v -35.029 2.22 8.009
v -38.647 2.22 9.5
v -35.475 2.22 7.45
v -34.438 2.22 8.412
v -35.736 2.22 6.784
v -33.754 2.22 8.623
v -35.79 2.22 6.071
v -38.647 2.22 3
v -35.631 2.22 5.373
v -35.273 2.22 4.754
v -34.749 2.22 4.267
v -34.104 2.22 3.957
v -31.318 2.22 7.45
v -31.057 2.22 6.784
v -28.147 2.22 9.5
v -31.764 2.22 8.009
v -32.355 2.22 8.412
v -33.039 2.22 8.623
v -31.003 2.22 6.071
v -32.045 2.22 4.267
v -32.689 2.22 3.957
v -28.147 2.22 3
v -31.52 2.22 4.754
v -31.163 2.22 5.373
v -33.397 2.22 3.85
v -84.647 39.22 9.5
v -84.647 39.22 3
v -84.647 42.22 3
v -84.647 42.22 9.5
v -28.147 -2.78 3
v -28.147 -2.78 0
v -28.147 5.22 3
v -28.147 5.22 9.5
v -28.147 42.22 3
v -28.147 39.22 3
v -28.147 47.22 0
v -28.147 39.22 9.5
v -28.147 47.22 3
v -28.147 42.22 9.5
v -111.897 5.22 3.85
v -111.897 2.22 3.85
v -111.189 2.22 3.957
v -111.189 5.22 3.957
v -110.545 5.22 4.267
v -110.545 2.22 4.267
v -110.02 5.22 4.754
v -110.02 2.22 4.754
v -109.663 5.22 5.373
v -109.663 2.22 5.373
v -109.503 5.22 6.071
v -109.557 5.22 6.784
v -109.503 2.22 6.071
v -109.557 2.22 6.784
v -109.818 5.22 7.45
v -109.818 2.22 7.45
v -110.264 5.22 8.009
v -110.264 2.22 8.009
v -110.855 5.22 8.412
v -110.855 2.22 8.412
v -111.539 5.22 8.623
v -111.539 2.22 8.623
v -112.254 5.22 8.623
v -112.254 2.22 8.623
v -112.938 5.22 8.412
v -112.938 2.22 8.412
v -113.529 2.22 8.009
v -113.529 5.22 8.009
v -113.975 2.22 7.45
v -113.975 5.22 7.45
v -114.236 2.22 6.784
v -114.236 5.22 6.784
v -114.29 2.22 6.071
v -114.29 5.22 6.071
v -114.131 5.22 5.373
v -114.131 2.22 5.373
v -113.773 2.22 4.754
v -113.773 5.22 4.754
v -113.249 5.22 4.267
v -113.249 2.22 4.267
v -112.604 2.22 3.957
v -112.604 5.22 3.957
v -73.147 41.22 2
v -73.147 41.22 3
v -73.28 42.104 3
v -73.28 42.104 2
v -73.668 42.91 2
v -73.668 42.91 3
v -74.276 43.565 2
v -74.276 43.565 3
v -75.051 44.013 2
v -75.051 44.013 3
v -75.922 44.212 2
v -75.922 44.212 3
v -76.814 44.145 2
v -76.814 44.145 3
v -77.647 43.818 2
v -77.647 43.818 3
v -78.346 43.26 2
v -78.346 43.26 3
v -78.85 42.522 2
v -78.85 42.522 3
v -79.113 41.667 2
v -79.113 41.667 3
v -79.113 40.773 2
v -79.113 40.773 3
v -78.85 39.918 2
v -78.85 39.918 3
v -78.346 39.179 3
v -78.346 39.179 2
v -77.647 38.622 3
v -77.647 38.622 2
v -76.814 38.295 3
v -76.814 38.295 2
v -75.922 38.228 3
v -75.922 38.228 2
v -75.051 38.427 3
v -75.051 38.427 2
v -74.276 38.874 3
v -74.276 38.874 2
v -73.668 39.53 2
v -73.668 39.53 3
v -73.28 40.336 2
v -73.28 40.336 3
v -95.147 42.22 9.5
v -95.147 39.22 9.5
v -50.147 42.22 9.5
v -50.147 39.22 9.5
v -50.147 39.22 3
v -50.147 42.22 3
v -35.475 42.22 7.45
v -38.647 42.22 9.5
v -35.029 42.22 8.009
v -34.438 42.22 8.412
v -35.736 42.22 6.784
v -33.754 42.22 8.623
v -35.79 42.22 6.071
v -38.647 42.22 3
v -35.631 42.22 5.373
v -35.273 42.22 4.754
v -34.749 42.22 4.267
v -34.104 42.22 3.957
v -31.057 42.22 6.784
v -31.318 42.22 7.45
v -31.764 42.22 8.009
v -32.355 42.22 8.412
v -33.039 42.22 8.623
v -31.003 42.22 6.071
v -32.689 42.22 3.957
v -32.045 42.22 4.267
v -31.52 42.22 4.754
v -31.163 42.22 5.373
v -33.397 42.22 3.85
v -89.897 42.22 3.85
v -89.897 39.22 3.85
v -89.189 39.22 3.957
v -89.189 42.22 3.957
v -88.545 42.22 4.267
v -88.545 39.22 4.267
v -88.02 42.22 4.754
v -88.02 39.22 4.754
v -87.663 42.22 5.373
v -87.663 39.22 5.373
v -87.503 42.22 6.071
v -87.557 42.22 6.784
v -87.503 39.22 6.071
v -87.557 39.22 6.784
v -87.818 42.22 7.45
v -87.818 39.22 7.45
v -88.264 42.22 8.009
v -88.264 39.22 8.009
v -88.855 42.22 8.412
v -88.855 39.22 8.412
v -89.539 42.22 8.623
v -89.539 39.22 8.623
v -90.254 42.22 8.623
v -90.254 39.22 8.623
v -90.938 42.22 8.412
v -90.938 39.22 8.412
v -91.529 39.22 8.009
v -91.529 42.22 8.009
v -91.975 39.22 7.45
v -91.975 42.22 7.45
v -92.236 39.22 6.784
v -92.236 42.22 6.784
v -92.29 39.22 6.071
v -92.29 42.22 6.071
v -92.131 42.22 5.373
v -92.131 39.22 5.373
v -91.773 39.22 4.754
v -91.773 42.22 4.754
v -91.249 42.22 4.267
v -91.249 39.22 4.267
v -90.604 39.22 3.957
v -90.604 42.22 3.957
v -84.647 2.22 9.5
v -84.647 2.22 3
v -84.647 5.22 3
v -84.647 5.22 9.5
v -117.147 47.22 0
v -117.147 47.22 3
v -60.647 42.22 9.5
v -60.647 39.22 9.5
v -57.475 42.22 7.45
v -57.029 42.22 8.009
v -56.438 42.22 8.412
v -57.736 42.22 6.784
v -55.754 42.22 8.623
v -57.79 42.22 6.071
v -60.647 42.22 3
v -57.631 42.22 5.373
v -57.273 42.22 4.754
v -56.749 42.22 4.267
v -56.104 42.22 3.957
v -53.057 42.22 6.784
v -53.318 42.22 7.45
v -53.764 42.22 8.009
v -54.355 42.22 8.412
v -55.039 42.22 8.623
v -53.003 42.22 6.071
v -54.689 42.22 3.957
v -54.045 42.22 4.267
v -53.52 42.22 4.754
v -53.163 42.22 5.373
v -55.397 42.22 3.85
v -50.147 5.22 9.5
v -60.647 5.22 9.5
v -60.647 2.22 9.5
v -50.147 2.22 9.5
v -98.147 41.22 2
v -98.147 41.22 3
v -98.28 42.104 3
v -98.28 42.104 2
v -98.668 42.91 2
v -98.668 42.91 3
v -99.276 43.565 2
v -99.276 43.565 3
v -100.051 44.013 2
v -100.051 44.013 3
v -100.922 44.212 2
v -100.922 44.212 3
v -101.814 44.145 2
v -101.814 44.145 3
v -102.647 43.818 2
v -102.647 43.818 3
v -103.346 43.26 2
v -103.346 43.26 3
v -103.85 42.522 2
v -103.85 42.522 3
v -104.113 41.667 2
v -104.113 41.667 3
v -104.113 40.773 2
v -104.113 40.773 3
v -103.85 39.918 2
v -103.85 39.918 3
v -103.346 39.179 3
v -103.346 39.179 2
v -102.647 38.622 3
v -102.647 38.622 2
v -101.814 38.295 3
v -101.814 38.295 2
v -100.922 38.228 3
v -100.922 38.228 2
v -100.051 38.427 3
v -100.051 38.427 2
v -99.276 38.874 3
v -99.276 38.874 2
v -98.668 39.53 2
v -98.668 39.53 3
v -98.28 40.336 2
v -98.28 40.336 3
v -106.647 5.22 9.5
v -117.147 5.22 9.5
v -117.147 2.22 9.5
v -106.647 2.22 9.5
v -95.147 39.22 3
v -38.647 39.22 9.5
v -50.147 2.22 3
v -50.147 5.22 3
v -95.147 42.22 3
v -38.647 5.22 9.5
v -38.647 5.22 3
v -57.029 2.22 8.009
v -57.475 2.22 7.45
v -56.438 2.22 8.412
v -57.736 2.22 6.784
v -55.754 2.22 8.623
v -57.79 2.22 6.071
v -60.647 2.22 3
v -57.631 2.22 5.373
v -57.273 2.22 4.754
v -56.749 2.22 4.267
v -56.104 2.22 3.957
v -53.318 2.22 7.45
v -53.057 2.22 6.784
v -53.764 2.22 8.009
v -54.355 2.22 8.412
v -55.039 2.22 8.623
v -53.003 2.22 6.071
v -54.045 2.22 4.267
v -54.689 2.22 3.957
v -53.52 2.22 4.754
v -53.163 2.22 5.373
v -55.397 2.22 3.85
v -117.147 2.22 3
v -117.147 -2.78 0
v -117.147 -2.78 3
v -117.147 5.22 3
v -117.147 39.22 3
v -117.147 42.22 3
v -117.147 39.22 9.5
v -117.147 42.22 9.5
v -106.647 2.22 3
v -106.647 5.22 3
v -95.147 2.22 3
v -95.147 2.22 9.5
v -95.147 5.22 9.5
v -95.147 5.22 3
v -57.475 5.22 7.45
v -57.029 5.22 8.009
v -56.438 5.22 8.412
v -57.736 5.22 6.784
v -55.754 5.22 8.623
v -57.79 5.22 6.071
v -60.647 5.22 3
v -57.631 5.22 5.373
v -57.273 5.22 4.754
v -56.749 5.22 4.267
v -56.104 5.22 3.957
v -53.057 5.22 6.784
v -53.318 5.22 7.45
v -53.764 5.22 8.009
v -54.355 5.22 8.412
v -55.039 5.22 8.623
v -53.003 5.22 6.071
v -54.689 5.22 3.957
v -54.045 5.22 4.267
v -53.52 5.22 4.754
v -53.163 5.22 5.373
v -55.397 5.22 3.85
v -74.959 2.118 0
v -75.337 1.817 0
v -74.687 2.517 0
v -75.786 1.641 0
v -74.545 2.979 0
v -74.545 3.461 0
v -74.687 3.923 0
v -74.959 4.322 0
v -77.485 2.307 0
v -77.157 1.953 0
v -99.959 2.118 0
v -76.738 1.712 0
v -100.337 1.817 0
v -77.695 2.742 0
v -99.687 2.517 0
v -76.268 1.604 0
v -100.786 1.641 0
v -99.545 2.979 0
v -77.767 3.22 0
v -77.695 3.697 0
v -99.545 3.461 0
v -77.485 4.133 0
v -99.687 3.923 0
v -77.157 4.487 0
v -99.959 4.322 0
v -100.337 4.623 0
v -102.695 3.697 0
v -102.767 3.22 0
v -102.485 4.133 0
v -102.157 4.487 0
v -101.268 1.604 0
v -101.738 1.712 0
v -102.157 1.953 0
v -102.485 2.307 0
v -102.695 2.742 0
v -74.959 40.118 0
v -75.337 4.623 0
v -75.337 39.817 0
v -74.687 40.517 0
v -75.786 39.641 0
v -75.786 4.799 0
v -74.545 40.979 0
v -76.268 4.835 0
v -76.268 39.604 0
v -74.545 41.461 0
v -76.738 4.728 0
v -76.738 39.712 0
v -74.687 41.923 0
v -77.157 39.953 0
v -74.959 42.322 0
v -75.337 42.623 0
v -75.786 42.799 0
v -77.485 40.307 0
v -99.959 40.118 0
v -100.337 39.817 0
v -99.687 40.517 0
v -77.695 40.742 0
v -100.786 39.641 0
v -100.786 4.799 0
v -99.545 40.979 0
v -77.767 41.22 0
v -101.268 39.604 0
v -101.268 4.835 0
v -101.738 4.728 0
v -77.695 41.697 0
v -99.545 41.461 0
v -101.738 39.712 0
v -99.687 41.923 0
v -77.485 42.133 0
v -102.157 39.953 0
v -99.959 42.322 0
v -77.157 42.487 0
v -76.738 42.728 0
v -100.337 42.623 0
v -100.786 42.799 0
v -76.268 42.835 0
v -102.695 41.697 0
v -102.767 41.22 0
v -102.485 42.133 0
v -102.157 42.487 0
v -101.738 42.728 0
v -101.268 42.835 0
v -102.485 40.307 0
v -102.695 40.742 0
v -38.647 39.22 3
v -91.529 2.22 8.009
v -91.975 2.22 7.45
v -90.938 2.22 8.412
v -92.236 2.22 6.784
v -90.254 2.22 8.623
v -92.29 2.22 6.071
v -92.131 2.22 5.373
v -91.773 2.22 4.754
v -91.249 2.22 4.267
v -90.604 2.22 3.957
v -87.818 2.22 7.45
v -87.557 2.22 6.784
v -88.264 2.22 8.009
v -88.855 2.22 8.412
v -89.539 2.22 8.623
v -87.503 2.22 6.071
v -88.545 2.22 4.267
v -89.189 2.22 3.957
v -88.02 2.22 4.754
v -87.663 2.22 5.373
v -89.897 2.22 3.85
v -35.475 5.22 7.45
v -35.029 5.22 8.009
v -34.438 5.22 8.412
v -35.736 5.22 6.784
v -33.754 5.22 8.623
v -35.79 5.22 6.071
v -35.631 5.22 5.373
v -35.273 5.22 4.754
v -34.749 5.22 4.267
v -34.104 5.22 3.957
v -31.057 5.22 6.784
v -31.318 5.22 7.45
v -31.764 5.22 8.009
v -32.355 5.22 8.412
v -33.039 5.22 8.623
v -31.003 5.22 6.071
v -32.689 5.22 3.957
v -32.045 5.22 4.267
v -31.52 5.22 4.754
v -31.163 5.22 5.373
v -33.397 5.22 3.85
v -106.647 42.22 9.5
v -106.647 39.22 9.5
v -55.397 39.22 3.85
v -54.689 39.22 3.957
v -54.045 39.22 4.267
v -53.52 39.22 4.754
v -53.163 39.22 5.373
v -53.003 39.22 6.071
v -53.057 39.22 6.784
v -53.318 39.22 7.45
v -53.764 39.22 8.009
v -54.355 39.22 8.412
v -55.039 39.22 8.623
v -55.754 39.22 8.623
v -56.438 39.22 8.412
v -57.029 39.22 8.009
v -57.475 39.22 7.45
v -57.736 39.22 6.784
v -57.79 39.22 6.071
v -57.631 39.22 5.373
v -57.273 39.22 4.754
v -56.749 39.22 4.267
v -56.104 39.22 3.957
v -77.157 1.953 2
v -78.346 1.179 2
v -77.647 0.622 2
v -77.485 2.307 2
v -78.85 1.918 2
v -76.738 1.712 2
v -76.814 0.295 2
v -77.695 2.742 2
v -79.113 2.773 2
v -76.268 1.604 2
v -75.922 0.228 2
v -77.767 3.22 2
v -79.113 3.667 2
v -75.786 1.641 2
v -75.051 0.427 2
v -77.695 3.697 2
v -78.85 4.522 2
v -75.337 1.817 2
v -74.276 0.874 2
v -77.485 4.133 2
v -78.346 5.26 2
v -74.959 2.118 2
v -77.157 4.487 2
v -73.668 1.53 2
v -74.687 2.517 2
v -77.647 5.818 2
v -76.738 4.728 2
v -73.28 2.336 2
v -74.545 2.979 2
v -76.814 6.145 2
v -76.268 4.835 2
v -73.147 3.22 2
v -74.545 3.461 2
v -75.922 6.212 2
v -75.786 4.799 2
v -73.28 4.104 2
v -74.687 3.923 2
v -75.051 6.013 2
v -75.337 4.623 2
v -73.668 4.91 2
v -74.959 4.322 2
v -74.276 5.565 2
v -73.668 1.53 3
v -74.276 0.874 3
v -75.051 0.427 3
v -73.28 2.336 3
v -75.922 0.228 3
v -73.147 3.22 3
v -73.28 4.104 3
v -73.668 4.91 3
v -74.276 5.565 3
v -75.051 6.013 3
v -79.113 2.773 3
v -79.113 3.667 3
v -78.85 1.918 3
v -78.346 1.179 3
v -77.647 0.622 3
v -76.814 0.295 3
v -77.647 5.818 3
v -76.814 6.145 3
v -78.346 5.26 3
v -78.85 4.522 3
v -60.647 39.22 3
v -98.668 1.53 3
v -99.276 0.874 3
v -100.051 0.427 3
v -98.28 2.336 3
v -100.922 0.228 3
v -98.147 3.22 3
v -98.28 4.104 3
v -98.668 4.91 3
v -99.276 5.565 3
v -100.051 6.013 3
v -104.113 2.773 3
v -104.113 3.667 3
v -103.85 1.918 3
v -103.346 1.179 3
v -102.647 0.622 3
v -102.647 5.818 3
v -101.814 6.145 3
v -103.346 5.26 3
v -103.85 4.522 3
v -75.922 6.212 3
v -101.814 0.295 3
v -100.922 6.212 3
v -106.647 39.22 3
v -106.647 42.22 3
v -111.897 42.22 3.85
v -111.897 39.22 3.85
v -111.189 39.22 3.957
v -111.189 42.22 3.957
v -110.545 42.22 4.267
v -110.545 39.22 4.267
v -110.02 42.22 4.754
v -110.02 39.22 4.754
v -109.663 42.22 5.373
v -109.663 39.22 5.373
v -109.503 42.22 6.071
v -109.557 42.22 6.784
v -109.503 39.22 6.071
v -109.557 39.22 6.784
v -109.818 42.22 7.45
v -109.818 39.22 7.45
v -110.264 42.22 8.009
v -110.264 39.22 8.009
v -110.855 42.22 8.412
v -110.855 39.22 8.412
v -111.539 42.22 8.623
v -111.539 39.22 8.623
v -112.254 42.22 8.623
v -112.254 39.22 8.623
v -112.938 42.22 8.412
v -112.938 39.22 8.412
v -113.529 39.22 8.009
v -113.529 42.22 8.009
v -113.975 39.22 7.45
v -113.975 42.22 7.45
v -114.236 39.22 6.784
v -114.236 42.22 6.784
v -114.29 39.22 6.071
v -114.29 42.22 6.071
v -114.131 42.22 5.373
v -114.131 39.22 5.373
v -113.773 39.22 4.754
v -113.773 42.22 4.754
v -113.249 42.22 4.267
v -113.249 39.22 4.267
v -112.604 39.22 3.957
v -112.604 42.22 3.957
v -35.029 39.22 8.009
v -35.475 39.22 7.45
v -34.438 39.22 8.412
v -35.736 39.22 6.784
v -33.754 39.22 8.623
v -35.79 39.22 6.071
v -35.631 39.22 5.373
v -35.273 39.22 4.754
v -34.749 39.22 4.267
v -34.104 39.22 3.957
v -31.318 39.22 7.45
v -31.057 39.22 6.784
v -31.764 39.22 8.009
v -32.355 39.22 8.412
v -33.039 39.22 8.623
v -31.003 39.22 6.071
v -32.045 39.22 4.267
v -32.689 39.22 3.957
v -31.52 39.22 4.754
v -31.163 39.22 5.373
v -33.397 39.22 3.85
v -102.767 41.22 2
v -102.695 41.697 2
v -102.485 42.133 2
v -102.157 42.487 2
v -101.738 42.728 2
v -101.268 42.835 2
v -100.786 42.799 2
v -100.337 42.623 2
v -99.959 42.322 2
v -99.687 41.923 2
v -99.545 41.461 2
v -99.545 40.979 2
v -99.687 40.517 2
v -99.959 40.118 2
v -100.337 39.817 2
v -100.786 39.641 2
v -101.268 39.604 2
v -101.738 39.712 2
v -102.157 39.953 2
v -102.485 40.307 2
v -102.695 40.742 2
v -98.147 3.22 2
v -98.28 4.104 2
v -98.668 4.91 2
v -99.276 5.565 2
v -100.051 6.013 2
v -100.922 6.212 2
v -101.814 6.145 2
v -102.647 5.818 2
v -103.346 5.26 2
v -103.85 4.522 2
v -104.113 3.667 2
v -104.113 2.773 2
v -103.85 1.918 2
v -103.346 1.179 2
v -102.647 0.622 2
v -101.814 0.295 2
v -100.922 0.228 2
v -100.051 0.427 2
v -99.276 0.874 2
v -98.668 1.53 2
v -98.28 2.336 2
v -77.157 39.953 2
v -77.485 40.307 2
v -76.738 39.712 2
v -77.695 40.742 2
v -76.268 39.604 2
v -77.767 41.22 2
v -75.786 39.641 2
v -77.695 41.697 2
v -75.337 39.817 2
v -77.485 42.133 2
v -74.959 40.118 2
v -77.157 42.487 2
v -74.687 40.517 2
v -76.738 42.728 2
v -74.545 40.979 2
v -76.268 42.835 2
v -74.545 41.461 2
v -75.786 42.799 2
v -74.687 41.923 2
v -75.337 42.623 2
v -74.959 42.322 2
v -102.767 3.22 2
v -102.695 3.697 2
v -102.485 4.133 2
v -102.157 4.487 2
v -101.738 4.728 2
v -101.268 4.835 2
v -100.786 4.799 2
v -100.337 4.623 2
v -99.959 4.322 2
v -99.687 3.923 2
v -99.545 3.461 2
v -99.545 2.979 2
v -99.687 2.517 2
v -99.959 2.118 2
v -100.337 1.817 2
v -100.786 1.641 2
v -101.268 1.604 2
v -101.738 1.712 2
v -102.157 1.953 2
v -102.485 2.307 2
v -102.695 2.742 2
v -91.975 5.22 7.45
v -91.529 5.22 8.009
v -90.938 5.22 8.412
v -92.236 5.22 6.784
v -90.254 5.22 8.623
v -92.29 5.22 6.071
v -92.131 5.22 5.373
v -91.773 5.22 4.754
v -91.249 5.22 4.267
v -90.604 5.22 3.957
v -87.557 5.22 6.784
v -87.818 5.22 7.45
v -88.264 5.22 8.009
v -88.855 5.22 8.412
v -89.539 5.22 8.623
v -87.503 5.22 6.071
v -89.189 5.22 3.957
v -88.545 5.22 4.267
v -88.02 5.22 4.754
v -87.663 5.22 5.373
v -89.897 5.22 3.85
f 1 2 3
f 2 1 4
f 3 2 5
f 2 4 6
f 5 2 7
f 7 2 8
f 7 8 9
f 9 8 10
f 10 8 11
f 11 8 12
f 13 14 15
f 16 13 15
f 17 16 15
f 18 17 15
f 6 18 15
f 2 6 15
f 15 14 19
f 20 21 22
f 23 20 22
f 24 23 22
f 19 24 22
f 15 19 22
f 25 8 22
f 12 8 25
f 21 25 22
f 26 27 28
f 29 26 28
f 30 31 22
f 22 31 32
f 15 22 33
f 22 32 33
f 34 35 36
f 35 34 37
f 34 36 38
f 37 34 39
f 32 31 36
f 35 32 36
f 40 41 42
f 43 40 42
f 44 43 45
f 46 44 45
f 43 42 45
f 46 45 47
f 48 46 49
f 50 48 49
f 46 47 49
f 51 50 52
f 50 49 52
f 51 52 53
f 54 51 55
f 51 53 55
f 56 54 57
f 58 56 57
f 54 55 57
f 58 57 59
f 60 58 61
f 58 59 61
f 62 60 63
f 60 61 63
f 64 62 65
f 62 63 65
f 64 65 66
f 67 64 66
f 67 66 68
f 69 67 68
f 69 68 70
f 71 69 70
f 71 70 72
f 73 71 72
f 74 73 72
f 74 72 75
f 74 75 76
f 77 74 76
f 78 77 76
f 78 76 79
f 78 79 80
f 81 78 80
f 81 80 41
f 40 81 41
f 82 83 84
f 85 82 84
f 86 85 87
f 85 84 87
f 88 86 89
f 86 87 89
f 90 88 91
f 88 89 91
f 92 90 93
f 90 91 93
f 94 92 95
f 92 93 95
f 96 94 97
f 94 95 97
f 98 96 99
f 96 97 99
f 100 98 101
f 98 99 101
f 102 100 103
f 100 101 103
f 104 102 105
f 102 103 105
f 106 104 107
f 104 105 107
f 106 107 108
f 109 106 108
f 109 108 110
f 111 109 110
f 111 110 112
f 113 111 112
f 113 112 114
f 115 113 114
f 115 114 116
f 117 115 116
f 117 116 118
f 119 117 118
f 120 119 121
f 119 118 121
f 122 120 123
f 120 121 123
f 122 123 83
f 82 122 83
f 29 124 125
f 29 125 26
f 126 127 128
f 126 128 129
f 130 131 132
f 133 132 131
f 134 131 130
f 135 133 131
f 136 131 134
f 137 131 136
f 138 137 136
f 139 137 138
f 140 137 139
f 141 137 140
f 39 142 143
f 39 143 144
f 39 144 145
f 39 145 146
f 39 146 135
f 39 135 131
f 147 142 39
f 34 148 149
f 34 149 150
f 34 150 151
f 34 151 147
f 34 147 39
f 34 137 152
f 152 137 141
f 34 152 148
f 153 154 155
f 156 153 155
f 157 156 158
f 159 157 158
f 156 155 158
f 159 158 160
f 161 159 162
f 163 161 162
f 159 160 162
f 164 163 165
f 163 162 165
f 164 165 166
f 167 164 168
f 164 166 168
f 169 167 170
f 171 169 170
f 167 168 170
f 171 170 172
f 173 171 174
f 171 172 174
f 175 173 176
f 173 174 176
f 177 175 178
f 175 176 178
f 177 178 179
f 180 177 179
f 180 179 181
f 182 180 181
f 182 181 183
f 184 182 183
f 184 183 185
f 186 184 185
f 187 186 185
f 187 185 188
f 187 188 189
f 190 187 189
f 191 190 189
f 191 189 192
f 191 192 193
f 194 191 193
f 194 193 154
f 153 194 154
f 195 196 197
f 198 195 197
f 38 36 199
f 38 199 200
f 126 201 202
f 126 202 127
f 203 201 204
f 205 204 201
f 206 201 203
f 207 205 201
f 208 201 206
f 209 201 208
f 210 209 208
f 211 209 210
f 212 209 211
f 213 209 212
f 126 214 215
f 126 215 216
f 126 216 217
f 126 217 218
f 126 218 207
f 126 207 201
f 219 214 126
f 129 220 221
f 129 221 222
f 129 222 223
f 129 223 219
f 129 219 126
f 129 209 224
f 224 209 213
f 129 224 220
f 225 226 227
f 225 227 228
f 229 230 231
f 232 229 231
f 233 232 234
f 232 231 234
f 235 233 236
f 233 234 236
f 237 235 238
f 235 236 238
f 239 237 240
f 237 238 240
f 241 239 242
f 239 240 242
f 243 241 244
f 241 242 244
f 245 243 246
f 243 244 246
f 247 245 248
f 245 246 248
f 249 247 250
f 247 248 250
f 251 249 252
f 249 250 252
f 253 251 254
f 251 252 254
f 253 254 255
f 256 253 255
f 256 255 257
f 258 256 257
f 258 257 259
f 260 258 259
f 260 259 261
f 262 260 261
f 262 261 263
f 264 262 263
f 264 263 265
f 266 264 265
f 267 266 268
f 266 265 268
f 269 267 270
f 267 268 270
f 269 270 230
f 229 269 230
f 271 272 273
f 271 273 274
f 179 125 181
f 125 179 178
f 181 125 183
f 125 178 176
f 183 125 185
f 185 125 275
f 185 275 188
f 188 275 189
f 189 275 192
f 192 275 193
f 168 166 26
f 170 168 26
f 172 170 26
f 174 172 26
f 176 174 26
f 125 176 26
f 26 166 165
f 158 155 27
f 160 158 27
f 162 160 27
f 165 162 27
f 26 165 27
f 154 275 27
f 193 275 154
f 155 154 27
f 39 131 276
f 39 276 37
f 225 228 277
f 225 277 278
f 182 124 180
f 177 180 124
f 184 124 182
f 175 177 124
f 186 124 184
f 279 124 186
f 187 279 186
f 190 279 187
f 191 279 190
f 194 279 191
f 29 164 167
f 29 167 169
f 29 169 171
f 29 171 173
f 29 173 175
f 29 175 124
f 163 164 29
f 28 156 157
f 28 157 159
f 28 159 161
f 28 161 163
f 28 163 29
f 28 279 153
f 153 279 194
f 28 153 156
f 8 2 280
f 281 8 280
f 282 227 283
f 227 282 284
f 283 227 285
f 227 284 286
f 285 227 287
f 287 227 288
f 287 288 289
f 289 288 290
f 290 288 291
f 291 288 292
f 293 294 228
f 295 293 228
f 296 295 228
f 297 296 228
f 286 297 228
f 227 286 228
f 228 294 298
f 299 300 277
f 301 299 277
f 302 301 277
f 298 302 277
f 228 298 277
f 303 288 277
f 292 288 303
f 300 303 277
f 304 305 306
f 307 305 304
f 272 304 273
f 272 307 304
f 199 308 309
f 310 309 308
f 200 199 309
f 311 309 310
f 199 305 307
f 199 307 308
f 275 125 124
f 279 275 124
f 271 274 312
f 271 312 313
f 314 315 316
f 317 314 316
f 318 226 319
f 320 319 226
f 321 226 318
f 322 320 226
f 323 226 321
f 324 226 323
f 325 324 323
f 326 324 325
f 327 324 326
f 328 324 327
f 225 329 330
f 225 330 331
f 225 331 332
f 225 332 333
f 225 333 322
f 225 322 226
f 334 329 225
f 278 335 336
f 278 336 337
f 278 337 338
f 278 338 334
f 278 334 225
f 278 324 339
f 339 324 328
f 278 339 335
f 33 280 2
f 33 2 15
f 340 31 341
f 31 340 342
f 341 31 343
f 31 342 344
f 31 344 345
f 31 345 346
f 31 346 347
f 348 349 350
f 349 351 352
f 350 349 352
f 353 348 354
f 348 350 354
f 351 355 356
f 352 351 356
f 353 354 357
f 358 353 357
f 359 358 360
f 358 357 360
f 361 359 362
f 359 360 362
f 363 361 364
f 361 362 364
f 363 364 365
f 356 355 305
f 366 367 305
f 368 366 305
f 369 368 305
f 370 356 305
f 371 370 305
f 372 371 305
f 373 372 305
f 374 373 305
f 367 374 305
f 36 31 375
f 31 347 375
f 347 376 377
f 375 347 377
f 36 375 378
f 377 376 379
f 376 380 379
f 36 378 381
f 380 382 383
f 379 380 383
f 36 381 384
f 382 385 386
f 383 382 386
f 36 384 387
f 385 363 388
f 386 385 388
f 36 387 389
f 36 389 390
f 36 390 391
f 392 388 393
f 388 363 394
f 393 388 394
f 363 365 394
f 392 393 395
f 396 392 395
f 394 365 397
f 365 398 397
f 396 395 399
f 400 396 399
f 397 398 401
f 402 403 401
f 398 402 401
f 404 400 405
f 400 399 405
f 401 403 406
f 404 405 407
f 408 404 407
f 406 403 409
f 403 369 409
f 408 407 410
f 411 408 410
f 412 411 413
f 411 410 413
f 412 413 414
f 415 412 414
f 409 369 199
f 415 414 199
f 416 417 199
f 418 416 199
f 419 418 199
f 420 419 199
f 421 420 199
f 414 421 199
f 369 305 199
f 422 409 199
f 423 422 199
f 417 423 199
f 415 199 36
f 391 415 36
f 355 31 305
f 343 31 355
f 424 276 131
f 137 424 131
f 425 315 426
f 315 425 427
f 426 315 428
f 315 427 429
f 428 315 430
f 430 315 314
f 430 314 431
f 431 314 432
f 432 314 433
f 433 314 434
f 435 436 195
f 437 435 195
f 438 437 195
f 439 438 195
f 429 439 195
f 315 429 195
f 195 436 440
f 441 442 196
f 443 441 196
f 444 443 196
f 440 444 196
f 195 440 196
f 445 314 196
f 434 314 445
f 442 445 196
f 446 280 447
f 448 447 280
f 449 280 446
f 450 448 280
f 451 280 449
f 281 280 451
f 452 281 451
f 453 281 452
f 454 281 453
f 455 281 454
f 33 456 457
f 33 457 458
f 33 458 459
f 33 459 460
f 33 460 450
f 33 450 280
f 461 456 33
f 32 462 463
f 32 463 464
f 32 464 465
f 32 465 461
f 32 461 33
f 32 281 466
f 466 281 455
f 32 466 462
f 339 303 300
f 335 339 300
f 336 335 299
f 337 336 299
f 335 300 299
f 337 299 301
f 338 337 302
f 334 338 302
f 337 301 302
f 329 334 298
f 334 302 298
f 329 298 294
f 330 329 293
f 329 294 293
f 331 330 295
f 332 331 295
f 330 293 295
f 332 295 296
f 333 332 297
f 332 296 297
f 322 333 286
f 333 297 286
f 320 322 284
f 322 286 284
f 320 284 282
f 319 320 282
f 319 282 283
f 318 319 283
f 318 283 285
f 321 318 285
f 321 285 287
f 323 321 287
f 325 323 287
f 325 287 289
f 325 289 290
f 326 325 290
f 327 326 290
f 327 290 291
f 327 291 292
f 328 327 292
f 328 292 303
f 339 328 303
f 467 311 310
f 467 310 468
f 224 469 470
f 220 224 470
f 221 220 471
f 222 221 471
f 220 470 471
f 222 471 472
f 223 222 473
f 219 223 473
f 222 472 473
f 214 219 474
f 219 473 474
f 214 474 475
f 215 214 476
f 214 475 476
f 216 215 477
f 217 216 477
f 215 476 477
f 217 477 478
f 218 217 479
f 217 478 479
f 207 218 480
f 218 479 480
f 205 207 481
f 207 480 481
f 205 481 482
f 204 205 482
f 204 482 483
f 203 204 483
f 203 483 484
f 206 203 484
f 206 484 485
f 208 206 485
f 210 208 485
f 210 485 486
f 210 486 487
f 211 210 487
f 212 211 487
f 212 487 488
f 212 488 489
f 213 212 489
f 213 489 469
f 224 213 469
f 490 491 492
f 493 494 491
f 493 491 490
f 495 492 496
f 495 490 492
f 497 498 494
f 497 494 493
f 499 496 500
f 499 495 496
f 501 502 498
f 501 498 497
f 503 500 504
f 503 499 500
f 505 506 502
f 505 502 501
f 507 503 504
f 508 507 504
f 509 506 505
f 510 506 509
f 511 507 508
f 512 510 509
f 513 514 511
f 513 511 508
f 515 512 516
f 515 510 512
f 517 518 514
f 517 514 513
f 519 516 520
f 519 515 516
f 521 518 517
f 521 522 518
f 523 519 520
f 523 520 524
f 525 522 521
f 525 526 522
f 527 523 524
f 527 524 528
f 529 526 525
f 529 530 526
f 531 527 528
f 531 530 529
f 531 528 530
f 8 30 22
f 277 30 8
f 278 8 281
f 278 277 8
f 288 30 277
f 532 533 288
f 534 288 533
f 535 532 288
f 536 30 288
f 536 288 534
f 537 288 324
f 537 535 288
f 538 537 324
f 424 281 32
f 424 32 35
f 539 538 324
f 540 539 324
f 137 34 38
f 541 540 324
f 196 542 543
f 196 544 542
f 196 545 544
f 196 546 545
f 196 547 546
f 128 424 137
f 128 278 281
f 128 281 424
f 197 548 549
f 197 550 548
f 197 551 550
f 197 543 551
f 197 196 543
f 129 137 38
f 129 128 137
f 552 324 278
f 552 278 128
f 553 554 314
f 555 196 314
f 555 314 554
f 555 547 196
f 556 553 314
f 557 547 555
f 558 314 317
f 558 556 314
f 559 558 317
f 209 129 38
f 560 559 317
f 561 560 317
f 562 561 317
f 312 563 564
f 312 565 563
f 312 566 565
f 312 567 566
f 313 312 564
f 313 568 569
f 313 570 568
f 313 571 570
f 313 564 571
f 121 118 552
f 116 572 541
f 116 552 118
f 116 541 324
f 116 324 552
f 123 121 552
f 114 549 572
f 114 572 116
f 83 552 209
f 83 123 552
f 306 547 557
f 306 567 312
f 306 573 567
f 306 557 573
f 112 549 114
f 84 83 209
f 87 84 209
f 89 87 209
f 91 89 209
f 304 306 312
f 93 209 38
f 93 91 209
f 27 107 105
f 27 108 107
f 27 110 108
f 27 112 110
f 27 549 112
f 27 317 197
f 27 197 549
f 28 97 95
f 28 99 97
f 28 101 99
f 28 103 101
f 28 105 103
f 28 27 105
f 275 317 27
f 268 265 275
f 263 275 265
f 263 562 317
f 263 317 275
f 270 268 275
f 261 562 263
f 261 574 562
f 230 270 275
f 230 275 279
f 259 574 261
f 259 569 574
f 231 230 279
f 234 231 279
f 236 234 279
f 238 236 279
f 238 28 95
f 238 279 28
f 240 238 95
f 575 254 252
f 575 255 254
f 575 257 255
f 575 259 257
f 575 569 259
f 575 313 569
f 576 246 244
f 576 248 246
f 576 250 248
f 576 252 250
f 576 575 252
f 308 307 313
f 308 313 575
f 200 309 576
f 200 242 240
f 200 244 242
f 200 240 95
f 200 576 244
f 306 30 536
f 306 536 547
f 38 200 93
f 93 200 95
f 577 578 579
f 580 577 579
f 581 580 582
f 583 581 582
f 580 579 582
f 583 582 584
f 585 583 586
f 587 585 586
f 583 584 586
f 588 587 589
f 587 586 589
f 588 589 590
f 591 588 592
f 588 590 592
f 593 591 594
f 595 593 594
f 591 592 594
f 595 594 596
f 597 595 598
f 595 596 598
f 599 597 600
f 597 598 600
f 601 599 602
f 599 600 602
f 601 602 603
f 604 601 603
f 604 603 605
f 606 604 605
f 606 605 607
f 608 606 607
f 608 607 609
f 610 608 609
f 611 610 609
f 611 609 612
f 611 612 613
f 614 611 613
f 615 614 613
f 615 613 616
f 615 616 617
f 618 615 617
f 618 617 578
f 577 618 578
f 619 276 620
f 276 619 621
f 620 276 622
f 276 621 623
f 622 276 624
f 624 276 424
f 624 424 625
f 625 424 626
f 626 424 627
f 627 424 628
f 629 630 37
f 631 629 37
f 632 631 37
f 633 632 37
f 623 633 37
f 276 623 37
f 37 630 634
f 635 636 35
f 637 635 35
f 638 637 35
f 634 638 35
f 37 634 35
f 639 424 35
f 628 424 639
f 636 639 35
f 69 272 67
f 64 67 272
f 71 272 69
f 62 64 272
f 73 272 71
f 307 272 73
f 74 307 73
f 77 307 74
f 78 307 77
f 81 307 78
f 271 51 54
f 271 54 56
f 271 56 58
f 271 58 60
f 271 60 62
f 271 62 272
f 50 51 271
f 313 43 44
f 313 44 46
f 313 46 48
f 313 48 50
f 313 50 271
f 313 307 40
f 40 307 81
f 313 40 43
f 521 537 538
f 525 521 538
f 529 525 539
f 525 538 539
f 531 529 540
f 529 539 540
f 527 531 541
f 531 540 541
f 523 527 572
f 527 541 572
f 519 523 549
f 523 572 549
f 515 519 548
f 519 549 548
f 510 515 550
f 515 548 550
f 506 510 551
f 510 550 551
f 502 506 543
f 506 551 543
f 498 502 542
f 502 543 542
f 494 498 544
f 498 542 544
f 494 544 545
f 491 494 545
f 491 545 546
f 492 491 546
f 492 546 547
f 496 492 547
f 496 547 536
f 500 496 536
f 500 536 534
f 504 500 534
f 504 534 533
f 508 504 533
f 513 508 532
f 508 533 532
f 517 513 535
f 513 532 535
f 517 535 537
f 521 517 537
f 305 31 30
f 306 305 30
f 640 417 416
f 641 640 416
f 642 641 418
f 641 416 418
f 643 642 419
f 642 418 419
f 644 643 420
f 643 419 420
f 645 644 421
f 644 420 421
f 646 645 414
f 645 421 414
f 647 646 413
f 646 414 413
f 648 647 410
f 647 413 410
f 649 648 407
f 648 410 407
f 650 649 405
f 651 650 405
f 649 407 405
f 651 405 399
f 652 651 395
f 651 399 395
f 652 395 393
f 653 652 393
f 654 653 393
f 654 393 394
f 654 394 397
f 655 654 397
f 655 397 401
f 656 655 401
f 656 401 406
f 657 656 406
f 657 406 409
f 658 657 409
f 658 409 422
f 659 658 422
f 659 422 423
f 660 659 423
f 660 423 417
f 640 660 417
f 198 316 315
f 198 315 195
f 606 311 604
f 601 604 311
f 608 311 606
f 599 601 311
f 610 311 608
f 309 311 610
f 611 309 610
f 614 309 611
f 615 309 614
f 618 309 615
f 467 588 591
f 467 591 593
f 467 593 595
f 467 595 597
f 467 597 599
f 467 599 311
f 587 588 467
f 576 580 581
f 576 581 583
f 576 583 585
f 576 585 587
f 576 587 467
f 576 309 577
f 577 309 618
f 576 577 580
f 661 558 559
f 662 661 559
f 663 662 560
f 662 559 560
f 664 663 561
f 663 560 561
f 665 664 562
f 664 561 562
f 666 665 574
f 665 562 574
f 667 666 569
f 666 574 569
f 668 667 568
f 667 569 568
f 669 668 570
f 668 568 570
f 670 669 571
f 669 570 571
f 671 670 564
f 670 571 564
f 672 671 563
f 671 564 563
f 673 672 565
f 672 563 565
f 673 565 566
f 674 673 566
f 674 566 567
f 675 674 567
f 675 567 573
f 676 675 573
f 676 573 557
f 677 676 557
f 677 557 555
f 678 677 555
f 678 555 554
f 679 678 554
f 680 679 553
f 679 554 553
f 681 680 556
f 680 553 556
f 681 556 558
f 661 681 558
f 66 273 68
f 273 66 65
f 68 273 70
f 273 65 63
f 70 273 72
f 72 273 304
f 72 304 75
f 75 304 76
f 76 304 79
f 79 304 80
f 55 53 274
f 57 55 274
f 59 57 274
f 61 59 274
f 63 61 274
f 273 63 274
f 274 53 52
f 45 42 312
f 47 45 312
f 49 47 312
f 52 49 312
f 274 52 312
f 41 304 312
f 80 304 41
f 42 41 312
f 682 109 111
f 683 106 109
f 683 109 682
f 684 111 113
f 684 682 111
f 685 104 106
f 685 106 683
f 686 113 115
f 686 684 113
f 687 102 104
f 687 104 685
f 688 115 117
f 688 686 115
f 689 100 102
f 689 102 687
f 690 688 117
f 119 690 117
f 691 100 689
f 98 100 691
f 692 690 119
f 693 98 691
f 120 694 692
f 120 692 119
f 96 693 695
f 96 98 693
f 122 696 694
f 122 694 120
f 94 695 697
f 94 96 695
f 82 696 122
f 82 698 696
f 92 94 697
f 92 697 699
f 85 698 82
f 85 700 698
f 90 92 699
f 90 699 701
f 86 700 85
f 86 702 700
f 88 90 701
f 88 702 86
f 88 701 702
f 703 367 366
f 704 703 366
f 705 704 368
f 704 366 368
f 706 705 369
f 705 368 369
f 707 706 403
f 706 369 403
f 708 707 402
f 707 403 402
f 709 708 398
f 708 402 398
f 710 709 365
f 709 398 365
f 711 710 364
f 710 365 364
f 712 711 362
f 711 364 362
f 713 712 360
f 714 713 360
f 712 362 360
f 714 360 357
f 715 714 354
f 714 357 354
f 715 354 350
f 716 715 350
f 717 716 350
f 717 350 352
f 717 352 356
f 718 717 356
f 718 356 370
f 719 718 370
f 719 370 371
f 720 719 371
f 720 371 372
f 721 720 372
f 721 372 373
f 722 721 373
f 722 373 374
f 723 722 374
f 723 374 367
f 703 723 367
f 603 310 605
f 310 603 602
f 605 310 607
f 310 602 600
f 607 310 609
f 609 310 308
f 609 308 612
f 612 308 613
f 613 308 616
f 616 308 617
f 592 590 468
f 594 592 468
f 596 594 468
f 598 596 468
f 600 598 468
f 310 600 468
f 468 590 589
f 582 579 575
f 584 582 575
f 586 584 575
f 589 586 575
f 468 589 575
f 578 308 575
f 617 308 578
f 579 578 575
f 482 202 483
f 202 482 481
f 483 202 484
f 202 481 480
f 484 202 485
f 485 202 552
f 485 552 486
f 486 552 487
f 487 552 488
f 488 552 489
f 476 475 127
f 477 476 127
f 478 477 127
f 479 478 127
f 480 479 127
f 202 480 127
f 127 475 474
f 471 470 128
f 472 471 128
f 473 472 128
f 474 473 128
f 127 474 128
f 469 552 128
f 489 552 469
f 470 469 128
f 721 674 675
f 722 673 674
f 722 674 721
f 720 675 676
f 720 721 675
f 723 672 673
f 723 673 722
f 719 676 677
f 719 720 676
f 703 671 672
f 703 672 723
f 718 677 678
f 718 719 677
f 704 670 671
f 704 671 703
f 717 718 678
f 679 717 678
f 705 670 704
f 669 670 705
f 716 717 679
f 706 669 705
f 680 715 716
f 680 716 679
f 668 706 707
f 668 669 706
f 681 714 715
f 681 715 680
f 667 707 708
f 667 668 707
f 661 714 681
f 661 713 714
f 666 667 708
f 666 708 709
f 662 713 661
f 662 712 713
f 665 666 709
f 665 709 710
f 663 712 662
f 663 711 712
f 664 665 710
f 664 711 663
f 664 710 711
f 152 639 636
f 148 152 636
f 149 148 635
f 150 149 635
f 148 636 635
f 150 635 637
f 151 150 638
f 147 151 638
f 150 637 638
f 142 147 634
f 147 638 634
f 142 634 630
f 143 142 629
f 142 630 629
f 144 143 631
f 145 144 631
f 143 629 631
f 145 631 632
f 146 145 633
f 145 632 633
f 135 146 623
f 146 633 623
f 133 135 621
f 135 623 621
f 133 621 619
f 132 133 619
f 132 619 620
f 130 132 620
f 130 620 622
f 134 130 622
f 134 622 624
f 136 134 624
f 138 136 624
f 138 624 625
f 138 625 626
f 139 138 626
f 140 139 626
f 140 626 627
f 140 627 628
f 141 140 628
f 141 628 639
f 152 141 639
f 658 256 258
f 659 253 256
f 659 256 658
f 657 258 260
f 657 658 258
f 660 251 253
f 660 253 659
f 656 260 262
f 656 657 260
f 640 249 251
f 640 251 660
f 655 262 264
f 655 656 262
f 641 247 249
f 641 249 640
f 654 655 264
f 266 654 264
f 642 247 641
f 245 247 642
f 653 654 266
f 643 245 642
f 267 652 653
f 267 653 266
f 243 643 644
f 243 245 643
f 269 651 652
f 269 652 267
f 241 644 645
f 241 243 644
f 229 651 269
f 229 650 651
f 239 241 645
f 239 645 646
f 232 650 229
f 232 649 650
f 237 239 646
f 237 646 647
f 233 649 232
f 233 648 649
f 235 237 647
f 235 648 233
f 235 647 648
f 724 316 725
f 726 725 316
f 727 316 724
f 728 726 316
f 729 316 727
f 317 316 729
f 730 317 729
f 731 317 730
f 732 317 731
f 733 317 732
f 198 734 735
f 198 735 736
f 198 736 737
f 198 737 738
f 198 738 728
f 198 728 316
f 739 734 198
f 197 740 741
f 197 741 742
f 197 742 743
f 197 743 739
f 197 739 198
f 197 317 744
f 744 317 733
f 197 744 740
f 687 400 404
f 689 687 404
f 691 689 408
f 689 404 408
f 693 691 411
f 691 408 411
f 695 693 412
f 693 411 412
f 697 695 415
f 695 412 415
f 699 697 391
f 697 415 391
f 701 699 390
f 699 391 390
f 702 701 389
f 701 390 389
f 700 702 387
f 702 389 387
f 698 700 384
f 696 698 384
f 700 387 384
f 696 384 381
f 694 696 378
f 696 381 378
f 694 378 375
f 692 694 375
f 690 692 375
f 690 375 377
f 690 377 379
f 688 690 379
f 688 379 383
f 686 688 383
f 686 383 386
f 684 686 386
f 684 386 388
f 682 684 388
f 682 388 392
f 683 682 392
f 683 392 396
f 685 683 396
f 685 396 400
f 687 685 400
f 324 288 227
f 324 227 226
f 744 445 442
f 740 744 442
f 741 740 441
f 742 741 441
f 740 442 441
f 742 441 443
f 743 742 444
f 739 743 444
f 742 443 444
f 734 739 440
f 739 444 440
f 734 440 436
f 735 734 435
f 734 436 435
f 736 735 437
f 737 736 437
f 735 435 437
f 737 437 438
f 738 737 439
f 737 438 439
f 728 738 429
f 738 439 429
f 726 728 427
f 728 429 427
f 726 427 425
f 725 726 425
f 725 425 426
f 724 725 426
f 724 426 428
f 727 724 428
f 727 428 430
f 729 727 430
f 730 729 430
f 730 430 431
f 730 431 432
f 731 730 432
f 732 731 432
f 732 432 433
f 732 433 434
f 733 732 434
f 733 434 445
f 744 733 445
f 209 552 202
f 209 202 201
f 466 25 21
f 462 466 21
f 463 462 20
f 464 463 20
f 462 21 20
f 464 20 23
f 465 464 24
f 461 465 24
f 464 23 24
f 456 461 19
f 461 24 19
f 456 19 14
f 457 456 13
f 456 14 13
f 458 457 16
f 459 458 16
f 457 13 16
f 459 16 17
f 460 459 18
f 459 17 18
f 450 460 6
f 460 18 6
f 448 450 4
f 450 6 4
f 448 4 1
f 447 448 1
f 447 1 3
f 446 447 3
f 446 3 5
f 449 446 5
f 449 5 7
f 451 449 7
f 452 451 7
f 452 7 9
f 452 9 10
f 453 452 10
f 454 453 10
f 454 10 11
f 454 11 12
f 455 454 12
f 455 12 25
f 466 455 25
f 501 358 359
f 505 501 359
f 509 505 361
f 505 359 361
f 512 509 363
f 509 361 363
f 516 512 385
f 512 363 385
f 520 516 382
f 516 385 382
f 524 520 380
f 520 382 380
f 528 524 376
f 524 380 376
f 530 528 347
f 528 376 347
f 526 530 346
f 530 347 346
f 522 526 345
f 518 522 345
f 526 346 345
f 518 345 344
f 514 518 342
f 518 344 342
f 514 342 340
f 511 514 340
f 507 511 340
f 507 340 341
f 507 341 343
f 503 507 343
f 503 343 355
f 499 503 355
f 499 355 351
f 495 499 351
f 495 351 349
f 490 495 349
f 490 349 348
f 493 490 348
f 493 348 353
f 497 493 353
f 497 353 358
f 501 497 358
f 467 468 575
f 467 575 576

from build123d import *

# Parameters (mm, degrees)
SKETCH_1_W          = 89
SKETCH_1_H          = 40
EXTRUDE_1_DEPTH     = 3
SKETCH_2_W          = 32.5
SKETCH_2_H          = 3
EXTRUDE_2_DEPTH     = 6.5
SKETCH_3_R          = 2.4
CUT_EXTRUDE_1_DEPTH = 100
SKETCH_5_W          = 3
SKETCH_5_H          = 5
EXTRUDE_3_DEPTH     = 89
SKETCH_7_W          = 11.5
SKETCH_7_H          = 50
CUT_EXTRUDE_2_DEPTH = 6.5
SKETCH_8_R          = 1.62
CUT_EXTRUDE_3_DEPTH = 127.662192681
SKETCH_9_R          = 3
CUT_EXTRUDE_4_DEPTH = 1


with BuildPart() as part:
    # 草图1 → 凸台-拉伸1 (new body)
    with BuildSketch(Plane.XY):
        with Locations((-72.64664311, 22.219964664)):
            Rectangle(SKETCH_1_W, SKETCH_1_H)
    extrude(amount=EXTRUDE_1_DEPTH)

    # 草图2 → 凸台-拉伸2 (add)
    with BuildSketch(Plane.XY.offset(3)):
        with Locations((-100.89664311, 40.719964664)):
            Rectangle(SKETCH_2_W, SKETCH_2_H)
        with Locations((-100.89664311, 3.719964664)):
            Rectangle(SKETCH_2_W, SKETCH_2_H)
        with Locations((-44.39664311, 40.719964664)):
            Rectangle(SKETCH_2_W, SKETCH_2_H)
        with Locations((-44.39664311, 3.719964664)):
            Rectangle(SKETCH_2_W, SKETCH_2_H)
    extrude(amount=EXTRUDE_2_DEPTH)

    # 草图3 → 切除-拉伸1 (cut)
    with BuildSketch(Plane(origin=(0, 2.219964664, 0), x_dir=(-1, 0, 0), z_dir=(0, -1, 0))):
        with Locations(Location((111.89664311, -6.25, 0), (0, 0, 90))):
            Circle(SKETCH_3_R)
        with Locations(Location((89.89664311, -6.25, 0), (0, 0, 90))):
            Circle(SKETCH_3_R)
        with Locations(Location((55.39664311, -6.25, 0), (0, 0, 90))):
            Circle(SKETCH_3_R)
        with Locations(Location((33.39664311, -6.25, 0), (0, 0, 90))):
            Circle(SKETCH_3_R)
    extrude(amount=-CUT_EXTRUDE_1_DEPTH, mode=Mode.SUBTRACT)

    # 草图5 → 凸台-拉伸3 (add)
    with BuildSketch(Plane.ZY.offset(117.14664311)):
        with Locations((1.5, 44.719964664)):
            Rectangle(SKETCH_5_W, SKETCH_5_H)
        with Locations((1.5, -0.280035336)):
            Rectangle(SKETCH_5_W, SKETCH_5_H)
    extrude(amount=-EXTRUDE_3_DEPTH)

    # 草图7 → 切除-拉伸2 (cut)
    with BuildSketch(Plane.XY.offset(9.5)):
        with Locations((-100.89664311, 22.219964664)):
            Rectangle(SKETCH_7_W, SKETCH_7_H)
        with Locations((-44.39664311, 22.219964664)):
            Rectangle(SKETCH_7_W, SKETCH_7_H)
    extrude(amount=-CUT_EXTRUDE_2_DEPTH, mode=Mode.SUBTRACT)

    # 草图8 → 切除-拉伸3 (cut, through all)
    with BuildSketch(Plane(origin=(0, 0, 0), x_dir=(-1, 0, 0), z_dir=(0, 0, -1))):
        with Locations((101.14664311, 41.219964664)):
            Circle(SKETCH_8_R)
        with Locations((101.14664311, 3.219964664)):
            Circle(SKETCH_8_R)
        with Locations((76.14664311, 41.219964664)):
            Circle(SKETCH_8_R)
        with Locations((76.14664311, 3.219964664)):
            Circle(SKETCH_8_R)
    extrude(amount=-CUT_EXTRUDE_3_DEPTH, mode=Mode.SUBTRACT)

    # 草图9 → 切除-拉伸4 (cut)
    with BuildSketch(Plane.XY.offset(3)):
        with Locations((-76.14664311, 41.219964664)):
            Circle(SKETCH_9_R)
        with Locations((-101.14664311, 41.219964664)):
            Circle(SKETCH_9_R)
        with Locations((-101.14664311, 3.219964664)):
            Circle(SKETCH_9_R)
        with Locations((-76.14664311, 3.219964664)):
            Circle(SKETCH_9_R)
    extrude(amount=-CUT_EXTRUDE_4_DEPTH, mode=Mode.SUBTRACT)


solid = part.part
